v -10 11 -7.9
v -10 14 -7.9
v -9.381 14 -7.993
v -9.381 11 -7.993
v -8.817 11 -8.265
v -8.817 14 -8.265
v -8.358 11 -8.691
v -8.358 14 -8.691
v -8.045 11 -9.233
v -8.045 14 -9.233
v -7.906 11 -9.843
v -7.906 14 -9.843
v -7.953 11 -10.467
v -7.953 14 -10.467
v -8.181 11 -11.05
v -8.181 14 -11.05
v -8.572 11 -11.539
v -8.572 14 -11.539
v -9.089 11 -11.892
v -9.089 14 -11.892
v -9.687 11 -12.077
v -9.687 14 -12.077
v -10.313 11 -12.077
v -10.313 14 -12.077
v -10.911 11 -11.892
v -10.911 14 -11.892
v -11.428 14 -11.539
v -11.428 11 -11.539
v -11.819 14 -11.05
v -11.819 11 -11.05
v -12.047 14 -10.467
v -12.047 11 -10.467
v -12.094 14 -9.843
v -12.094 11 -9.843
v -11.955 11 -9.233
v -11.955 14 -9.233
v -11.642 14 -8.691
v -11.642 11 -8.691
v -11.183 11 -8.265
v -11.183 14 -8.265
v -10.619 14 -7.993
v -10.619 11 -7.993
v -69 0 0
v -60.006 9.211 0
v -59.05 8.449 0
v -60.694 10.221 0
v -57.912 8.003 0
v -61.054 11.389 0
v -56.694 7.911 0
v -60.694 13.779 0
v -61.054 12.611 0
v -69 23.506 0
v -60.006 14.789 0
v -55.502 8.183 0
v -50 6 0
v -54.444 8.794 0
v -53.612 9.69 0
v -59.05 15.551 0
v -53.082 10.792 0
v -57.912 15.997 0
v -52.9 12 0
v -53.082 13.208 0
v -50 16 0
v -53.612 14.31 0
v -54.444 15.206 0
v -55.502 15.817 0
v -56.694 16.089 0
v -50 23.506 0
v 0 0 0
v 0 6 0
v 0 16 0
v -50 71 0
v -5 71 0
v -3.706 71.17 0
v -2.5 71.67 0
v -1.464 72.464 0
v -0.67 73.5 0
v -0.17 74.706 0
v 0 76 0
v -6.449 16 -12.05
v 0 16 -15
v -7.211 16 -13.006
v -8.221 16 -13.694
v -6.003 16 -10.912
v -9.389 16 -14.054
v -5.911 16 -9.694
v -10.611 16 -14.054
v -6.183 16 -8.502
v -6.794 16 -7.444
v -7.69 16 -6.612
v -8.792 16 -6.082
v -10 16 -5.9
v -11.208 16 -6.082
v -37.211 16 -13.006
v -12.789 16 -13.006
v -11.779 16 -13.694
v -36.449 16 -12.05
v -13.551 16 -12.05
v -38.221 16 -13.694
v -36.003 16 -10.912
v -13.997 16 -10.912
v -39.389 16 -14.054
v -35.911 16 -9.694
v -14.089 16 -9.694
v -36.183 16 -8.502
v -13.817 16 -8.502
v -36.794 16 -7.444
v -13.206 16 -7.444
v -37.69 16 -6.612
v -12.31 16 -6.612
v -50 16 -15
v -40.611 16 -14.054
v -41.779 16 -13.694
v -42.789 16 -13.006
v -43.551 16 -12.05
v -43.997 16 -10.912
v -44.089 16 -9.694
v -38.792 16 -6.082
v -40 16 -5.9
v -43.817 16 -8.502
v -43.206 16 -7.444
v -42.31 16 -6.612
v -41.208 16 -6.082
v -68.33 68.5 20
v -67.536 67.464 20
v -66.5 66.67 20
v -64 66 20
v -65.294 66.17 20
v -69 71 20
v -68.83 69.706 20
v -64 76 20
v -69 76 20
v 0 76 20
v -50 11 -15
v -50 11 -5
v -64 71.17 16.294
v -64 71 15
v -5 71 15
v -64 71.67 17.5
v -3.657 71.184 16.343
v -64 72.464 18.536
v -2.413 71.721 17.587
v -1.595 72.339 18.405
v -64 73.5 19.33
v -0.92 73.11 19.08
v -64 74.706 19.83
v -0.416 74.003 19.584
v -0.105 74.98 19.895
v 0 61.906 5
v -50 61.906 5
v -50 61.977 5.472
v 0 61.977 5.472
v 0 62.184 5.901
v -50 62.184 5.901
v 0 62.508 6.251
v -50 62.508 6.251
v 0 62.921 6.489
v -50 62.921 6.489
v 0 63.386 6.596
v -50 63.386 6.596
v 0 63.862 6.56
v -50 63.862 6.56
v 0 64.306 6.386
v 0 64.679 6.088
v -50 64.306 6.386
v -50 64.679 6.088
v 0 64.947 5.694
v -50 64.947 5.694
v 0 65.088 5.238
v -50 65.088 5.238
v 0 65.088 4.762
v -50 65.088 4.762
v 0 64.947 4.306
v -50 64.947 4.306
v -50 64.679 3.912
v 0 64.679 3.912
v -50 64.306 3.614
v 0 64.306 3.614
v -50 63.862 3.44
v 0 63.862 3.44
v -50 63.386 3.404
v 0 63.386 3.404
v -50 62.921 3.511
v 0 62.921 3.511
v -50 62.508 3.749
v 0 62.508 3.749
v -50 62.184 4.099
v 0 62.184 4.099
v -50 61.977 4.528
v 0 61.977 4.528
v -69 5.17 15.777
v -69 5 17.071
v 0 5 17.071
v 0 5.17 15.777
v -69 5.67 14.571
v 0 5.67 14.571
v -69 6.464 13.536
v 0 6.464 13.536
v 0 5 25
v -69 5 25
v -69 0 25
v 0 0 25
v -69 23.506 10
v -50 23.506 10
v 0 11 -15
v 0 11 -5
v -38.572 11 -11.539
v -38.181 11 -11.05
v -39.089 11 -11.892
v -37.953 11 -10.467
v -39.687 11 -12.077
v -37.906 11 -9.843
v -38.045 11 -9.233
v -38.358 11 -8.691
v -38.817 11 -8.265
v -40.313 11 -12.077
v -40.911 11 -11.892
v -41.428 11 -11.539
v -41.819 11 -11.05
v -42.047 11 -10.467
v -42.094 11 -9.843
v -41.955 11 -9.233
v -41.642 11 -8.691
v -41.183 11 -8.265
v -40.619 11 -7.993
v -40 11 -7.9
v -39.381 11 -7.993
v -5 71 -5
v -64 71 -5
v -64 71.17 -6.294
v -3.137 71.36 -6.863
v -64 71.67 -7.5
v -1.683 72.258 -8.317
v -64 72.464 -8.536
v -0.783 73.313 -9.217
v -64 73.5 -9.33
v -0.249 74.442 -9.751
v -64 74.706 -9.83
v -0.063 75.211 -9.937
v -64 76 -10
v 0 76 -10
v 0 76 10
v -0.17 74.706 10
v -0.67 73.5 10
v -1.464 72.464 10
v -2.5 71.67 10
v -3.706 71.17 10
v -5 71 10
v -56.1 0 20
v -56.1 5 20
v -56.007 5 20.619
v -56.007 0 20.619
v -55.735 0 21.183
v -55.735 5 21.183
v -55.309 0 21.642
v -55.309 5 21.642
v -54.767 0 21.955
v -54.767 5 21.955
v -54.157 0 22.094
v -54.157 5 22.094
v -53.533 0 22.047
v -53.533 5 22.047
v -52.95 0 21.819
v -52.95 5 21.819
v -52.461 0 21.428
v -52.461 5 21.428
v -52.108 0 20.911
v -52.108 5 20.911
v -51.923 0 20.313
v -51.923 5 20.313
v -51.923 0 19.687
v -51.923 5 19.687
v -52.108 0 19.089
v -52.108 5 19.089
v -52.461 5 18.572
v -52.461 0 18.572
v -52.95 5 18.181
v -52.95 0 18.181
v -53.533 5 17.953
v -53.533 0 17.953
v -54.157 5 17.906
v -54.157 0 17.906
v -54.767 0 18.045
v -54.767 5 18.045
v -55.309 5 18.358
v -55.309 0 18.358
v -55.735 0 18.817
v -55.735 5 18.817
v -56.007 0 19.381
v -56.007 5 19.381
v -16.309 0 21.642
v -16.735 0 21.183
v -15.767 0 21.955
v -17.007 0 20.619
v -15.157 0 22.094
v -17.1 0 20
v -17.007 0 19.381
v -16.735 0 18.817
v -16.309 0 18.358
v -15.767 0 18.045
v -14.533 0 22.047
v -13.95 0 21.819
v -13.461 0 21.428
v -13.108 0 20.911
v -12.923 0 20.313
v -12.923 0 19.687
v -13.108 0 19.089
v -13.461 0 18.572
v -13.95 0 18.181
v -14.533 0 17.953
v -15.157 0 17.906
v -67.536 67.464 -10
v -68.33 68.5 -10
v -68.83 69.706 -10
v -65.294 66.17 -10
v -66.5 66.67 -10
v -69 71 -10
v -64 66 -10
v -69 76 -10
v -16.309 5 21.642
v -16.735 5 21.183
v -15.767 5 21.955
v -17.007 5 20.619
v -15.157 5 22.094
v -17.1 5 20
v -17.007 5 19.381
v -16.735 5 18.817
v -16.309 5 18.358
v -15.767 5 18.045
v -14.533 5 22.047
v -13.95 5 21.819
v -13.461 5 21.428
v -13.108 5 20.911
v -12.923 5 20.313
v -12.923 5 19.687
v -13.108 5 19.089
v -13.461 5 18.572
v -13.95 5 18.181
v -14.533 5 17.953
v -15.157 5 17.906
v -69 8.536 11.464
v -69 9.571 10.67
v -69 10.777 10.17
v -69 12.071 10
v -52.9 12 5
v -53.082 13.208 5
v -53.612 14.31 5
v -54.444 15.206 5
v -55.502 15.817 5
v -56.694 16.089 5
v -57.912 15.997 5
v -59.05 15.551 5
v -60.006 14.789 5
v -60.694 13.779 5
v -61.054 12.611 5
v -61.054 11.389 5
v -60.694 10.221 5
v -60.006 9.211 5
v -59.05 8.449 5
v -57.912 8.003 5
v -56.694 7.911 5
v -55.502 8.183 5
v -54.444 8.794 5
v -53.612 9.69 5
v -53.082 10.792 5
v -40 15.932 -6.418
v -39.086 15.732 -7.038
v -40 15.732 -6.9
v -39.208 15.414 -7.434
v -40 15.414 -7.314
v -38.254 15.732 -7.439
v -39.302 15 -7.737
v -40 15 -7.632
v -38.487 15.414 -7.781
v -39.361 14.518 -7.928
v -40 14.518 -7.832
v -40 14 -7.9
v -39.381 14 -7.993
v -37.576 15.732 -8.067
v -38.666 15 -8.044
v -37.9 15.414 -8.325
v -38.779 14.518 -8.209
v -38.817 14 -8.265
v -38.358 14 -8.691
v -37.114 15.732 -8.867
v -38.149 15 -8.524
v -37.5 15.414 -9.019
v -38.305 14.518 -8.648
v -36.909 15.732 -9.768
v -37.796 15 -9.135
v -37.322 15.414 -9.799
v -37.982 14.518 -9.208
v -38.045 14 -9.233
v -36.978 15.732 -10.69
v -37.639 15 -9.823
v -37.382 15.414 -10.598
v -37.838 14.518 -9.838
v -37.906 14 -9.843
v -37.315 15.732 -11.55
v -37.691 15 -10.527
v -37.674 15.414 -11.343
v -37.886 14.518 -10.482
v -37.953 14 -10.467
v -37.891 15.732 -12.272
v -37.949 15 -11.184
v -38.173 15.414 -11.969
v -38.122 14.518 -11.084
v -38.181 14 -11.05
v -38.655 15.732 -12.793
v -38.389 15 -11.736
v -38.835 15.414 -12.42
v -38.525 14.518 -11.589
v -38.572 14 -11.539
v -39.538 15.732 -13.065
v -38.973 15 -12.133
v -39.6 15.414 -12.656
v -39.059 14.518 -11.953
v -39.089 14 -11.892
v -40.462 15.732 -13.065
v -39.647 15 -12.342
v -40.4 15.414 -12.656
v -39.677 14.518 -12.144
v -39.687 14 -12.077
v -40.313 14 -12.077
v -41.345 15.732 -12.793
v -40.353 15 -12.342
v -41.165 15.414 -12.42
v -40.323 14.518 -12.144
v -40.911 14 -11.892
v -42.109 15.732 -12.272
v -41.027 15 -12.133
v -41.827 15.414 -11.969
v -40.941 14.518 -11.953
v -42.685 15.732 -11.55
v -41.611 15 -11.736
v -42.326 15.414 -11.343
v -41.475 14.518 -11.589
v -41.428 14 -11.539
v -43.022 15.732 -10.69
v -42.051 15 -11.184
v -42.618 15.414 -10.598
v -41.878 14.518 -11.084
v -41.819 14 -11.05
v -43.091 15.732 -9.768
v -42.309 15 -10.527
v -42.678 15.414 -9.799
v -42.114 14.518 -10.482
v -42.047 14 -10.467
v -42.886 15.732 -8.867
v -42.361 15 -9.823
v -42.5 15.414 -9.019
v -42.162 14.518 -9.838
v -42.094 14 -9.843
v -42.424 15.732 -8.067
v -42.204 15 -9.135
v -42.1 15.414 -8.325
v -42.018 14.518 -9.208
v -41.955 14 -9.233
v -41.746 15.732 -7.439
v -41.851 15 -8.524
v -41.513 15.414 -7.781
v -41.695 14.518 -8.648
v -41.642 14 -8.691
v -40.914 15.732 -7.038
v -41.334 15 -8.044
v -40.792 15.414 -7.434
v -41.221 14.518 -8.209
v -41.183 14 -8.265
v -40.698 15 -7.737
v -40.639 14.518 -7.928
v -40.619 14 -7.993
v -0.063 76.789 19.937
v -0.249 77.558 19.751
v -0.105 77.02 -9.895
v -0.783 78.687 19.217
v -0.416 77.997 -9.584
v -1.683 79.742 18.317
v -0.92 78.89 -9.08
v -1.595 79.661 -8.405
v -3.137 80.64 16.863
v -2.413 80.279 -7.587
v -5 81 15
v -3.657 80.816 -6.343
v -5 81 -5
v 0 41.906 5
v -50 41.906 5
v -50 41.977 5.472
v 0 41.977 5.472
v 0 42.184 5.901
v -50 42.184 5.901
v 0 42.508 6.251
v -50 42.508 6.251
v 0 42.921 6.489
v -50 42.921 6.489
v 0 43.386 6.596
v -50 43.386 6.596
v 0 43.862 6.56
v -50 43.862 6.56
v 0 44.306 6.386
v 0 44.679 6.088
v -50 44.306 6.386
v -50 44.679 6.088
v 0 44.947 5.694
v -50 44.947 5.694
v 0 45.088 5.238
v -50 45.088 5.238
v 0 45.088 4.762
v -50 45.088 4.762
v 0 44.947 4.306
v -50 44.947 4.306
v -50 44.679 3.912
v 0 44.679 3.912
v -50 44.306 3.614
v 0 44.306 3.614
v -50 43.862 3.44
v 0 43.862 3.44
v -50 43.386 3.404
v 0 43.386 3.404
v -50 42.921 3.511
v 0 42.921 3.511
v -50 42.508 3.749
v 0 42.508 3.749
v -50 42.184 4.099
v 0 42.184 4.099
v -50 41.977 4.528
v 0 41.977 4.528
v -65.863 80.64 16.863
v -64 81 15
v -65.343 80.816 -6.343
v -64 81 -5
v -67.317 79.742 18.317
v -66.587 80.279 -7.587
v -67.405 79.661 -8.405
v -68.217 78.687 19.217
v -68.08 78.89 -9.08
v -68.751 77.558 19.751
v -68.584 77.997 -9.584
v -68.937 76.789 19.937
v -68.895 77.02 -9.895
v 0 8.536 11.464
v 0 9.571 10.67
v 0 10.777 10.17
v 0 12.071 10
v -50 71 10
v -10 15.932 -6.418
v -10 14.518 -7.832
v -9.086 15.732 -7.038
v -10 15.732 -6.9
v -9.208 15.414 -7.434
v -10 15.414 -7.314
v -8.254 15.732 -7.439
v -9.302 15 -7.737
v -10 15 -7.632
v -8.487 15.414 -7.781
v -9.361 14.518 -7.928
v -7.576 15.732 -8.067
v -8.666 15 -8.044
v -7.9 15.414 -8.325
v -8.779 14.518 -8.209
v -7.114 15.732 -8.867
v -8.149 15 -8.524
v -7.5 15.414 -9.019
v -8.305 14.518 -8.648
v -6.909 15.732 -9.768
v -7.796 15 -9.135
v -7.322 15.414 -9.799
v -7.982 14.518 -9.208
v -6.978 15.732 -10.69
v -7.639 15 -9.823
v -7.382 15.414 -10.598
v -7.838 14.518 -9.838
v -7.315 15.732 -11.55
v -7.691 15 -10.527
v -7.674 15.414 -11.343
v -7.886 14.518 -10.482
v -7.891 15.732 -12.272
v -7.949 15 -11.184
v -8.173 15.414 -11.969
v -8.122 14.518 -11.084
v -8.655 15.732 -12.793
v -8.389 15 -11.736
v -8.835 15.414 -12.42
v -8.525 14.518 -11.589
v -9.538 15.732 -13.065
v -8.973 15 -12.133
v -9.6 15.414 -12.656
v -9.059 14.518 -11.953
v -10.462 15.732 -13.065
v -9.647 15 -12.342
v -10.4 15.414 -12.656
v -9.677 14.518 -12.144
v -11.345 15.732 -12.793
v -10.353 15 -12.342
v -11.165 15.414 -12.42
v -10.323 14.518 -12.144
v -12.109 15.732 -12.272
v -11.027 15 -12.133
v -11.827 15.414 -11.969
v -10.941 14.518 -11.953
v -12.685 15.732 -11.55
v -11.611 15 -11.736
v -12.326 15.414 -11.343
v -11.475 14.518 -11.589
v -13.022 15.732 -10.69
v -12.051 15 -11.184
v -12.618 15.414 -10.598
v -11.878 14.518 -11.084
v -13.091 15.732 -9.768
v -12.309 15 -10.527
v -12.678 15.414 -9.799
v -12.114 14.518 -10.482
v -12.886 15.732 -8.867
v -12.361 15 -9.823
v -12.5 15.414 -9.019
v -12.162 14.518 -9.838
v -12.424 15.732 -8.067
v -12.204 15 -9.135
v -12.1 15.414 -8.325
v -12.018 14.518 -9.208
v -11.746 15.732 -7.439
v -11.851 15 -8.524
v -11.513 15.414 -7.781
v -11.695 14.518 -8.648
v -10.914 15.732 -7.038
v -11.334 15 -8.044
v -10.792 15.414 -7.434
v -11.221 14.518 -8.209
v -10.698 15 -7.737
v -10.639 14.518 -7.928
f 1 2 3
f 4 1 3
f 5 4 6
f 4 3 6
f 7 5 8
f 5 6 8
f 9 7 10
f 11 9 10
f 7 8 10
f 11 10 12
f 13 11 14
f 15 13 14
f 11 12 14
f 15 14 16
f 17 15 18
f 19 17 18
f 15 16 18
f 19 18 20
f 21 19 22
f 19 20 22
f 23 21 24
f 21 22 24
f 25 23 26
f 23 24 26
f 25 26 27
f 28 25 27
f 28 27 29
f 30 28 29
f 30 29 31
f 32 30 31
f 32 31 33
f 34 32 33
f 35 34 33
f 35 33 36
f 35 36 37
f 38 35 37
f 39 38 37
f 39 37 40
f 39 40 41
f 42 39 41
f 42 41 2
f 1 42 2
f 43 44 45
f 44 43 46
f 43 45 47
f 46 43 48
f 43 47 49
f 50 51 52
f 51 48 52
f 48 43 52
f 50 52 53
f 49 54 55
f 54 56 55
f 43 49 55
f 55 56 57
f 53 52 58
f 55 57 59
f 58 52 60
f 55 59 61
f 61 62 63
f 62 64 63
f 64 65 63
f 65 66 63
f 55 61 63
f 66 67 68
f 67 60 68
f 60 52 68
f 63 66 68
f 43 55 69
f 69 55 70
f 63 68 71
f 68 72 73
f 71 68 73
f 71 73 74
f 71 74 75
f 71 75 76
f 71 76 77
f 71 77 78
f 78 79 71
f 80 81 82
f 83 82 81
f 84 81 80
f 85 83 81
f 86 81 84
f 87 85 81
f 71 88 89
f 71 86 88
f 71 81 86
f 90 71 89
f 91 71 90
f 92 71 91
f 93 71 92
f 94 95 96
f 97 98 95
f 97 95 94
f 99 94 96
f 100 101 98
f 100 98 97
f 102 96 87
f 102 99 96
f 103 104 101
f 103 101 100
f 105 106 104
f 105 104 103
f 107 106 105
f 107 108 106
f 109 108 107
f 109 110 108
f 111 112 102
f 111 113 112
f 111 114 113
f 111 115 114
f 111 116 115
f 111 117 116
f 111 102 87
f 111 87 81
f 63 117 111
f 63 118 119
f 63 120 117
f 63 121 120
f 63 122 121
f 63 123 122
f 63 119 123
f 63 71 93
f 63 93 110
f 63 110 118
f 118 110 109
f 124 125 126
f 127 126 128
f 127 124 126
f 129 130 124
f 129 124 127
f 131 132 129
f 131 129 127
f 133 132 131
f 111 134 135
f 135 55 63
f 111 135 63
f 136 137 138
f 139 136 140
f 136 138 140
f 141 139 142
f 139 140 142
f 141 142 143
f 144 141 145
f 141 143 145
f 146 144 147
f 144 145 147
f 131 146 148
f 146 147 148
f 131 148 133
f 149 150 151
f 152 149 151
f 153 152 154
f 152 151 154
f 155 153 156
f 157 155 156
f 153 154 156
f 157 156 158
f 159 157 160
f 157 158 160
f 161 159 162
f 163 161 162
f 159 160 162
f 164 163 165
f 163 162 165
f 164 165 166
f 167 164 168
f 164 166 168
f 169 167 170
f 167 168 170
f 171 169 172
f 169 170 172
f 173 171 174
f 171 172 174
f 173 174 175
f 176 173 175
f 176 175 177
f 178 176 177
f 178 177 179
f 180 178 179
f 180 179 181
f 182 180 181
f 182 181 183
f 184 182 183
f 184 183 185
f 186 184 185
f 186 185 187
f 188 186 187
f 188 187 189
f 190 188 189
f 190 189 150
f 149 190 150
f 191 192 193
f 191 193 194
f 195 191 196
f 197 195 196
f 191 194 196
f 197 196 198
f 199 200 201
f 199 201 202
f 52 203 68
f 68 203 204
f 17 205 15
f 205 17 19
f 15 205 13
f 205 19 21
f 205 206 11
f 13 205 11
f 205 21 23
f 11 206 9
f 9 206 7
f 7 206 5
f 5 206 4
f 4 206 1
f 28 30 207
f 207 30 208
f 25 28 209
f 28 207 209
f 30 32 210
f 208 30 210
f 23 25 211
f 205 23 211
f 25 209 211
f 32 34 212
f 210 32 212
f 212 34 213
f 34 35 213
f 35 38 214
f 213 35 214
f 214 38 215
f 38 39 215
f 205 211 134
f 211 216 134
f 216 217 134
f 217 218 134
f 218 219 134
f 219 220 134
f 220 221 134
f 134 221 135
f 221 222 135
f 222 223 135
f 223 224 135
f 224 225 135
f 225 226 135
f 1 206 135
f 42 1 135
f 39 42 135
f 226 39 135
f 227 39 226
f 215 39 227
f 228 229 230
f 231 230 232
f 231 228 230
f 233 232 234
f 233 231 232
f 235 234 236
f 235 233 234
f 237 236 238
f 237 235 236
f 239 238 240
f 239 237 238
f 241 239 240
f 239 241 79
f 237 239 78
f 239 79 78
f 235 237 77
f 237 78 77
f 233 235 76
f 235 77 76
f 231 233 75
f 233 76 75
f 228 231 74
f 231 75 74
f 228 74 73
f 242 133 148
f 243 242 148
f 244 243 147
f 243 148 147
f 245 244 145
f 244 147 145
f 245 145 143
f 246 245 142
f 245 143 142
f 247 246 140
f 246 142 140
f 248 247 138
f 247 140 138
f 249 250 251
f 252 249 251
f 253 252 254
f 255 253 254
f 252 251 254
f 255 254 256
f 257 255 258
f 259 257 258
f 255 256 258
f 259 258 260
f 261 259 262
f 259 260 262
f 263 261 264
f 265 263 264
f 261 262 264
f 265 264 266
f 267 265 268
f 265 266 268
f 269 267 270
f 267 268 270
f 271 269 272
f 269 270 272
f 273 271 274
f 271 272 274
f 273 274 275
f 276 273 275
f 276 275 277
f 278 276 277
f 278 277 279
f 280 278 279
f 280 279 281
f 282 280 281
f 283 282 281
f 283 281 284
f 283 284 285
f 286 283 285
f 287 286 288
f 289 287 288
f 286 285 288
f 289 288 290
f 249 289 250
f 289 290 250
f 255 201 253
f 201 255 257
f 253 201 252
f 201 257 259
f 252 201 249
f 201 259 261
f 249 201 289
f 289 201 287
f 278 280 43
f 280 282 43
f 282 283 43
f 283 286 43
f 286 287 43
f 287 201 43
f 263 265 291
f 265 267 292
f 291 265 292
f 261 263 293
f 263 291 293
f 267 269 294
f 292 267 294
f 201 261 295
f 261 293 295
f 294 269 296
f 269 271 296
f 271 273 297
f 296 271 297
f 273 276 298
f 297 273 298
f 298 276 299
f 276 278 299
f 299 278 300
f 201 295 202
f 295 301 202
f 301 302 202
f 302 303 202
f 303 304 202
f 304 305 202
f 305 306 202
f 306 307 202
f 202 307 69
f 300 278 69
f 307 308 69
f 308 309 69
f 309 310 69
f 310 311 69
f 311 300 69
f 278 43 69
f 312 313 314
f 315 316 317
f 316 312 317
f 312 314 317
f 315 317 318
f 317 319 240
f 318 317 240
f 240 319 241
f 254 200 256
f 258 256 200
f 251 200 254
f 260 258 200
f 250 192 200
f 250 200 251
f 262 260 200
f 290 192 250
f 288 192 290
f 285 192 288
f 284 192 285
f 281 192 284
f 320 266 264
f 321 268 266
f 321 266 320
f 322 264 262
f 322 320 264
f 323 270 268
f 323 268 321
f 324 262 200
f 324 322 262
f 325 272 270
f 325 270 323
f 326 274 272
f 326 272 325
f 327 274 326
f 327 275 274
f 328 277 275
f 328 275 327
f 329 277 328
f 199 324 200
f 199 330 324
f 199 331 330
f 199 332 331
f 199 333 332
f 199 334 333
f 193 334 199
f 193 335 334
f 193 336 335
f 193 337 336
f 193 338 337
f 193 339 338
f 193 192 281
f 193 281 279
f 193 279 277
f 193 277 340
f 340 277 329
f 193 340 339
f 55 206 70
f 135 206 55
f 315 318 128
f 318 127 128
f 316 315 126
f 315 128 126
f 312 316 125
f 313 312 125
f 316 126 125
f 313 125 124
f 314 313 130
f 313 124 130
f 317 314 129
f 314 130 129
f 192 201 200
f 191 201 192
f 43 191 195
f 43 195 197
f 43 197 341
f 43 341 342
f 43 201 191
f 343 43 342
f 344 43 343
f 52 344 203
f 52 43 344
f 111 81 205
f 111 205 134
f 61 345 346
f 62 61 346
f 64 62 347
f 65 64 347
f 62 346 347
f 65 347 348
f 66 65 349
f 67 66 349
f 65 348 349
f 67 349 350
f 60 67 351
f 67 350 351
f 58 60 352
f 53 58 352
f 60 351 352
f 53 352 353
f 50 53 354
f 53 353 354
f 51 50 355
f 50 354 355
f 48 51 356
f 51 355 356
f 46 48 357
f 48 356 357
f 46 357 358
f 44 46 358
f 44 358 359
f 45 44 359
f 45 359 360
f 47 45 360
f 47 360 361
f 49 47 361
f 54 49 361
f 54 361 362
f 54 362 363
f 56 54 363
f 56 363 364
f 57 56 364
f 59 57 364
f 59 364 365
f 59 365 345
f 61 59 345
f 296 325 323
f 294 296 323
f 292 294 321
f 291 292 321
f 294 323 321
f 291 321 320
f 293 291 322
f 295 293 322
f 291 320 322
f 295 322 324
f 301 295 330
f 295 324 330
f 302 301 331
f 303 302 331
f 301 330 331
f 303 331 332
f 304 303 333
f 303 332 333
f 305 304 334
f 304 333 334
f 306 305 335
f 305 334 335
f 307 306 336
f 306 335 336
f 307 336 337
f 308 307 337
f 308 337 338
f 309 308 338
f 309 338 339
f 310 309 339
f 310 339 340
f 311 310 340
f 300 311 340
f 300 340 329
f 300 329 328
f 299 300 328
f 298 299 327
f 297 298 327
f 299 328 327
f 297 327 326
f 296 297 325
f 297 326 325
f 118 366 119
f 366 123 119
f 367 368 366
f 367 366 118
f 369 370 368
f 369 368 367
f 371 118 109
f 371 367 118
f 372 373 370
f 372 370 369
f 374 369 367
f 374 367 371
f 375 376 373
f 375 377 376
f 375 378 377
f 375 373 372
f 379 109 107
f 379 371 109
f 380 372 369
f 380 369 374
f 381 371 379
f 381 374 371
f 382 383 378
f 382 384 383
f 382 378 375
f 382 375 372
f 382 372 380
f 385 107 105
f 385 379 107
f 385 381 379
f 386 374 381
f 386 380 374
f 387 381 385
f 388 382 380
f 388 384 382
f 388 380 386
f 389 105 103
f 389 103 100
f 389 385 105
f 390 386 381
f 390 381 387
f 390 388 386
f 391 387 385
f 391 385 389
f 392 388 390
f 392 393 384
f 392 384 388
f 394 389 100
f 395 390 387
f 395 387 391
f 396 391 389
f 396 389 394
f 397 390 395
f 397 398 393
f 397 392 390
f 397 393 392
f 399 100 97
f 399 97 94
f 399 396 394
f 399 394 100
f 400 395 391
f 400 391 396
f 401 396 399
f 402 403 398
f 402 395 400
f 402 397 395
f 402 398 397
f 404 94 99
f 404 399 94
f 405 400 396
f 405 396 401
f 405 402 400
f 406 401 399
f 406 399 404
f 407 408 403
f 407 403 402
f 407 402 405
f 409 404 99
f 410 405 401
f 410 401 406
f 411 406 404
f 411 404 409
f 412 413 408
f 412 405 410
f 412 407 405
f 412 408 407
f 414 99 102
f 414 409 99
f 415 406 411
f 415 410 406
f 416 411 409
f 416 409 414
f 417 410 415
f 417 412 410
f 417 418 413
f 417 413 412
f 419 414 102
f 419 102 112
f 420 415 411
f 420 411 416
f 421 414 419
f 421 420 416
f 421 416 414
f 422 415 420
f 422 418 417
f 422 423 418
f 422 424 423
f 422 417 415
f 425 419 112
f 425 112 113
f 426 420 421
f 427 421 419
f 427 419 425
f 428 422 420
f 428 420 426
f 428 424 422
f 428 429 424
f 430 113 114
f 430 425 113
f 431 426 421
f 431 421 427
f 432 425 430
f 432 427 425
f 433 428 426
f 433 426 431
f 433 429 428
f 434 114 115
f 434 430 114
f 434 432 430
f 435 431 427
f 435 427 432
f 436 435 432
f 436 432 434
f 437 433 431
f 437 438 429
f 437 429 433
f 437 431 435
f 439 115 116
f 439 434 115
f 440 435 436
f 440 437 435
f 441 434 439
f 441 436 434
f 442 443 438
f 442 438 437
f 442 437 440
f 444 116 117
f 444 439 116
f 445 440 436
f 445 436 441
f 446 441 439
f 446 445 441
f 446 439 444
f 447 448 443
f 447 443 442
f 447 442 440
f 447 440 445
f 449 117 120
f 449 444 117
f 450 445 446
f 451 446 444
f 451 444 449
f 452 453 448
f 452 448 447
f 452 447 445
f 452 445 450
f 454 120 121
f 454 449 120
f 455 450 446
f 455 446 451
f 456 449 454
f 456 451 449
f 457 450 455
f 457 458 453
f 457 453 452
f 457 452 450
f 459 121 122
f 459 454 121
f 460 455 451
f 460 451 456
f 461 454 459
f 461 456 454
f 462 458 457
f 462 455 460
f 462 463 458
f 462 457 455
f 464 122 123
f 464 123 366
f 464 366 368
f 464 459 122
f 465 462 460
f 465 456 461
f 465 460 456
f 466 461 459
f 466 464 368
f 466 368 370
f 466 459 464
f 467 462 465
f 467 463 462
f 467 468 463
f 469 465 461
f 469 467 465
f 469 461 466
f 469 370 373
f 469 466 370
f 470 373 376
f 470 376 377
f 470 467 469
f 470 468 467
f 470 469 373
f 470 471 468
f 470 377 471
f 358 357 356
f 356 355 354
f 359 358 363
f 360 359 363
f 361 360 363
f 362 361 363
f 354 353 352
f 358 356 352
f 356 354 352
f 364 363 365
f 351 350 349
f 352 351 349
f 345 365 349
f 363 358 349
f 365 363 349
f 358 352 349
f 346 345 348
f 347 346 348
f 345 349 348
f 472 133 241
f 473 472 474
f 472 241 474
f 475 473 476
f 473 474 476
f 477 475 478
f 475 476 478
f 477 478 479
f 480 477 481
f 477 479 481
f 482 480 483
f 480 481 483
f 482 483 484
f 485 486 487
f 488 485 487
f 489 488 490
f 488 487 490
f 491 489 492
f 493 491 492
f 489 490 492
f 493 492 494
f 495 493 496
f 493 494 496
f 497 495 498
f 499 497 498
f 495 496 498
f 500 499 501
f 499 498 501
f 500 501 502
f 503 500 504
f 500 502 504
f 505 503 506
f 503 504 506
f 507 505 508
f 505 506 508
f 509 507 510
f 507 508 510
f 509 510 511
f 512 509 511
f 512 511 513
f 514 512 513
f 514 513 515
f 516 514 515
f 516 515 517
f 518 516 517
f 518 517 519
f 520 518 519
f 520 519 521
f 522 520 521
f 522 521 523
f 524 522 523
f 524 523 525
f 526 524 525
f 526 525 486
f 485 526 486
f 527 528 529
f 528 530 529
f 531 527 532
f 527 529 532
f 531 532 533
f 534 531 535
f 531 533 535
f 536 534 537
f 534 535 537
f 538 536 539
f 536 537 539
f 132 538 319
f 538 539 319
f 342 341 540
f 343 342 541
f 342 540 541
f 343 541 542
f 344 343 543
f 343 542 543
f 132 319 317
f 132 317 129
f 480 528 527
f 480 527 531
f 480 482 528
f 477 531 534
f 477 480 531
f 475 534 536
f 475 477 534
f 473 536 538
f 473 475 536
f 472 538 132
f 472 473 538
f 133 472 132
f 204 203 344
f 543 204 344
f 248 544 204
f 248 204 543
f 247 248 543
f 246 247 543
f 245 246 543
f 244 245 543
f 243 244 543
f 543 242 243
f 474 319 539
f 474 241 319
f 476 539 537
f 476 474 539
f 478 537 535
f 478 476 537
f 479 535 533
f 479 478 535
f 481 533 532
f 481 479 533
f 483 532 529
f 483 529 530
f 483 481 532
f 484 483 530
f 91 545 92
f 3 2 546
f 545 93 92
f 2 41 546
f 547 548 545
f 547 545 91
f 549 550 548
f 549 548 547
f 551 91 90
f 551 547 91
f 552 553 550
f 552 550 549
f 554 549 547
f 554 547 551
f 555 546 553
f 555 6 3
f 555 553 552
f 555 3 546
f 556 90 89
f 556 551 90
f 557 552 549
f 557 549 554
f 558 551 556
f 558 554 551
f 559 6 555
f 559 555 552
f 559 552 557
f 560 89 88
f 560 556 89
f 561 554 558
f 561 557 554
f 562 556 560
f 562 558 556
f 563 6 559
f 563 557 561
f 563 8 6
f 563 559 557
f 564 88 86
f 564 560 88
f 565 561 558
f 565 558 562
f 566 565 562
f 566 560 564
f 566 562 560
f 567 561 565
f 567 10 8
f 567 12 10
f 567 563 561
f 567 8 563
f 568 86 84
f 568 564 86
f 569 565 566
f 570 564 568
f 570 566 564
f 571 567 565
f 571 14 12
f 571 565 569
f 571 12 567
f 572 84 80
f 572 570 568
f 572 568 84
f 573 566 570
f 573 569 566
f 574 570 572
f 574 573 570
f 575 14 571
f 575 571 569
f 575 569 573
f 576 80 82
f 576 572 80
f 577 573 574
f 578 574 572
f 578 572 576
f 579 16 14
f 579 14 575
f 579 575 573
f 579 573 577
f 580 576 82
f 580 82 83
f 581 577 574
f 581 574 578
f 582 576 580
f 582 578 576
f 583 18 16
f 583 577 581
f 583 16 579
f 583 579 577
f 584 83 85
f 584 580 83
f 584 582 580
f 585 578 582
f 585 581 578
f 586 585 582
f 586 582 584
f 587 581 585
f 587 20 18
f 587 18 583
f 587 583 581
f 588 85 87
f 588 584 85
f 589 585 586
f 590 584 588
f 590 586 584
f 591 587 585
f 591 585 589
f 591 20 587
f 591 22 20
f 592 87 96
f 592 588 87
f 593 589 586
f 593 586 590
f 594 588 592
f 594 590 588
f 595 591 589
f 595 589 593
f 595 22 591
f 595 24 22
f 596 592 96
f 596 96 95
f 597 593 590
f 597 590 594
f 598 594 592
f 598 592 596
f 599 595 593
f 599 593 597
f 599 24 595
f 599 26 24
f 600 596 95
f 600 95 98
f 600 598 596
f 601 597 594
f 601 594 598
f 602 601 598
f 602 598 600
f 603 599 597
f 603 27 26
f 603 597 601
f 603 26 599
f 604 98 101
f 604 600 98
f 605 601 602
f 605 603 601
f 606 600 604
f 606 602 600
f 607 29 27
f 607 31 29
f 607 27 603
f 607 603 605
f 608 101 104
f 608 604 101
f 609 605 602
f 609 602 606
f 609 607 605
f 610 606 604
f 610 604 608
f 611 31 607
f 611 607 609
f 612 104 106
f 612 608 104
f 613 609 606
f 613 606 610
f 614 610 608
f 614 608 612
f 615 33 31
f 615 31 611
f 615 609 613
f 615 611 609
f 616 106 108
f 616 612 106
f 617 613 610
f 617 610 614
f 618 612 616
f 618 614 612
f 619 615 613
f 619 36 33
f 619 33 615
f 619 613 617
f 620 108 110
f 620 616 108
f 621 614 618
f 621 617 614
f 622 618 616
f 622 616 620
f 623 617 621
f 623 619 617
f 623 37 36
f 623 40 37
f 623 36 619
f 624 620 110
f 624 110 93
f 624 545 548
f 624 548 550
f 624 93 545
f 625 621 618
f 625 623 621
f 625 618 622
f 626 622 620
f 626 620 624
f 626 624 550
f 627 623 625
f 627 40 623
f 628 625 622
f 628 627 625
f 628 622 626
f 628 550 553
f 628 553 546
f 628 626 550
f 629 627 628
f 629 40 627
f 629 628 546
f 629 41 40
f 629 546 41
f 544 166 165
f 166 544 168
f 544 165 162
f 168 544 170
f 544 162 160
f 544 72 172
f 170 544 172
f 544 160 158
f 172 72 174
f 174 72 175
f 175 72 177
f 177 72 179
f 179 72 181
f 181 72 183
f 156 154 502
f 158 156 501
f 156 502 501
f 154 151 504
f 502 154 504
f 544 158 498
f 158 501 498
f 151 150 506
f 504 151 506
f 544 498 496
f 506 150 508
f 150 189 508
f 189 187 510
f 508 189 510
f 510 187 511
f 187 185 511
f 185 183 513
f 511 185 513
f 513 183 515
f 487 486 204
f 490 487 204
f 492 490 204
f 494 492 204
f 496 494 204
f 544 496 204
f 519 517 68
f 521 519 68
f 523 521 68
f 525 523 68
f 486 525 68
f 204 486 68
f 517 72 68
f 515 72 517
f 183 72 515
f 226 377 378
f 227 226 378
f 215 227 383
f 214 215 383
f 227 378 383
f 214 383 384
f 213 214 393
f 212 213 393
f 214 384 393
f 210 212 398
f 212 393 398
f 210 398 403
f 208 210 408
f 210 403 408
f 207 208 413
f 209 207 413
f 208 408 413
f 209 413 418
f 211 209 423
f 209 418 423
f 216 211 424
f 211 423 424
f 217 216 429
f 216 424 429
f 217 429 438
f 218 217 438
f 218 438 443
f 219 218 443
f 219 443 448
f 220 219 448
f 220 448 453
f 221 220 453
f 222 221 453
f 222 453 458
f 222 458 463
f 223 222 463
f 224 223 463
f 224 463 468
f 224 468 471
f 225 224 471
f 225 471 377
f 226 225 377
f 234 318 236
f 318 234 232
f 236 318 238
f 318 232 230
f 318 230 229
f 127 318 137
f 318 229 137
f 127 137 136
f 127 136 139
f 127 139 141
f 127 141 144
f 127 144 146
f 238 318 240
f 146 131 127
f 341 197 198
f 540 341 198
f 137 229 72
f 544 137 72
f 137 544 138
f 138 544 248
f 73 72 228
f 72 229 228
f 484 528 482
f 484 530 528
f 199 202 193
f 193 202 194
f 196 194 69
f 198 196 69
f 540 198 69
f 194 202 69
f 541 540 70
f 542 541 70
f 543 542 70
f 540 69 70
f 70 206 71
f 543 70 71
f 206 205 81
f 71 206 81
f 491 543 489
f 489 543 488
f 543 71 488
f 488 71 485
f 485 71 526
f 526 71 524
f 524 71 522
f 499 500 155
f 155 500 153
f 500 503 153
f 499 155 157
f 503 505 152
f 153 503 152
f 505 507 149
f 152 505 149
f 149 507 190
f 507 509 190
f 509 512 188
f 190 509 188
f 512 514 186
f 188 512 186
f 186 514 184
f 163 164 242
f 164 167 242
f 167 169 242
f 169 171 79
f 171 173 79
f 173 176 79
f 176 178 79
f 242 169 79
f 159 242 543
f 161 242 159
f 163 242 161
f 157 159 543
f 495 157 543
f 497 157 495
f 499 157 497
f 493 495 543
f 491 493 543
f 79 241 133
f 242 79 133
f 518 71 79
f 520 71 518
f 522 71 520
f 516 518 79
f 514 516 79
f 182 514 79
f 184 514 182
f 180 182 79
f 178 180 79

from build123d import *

# Parameters (mm, degrees)
BOSS_EXTRU_1_DEPTH      = 10
BOSS_EXTRU_2_DEPTH      = 10
BOSS_EXTRU_2_DEPTH_BACK = 20
ESQUISSE2_W             = 69
ESQUISSE2_H             = 10
ESQUISSE4_W             = 19
ESQUISSE4_H             = 23.50582434
ESQUISSE4_R             = 4.1
BOSS_EXTRU_3_DEPTH      = 10
ESQUISSE5_W             = 5
ESQUISSE5_H             = 30
BOSS_EXTRU_4_DEPTH      = 5
ESQUISSE6_W             = 69
ESQUISSE6_H             = 5
BOSS_EXTRU_5_DEPTH      = 15
ESQUISSE7_R             = 5.448918283
BOSS_EXTRU_6_DEPTH      = 5
CHANFREIN2_SIZE         = 5
ESQUISSE8_R             = 2.1
ENL_V_MAT_EXTRU_1_DEPTH = 5
ESQUISSE9_R             = 1.6
ENL_V_MAT_EXTRU_2_DEPTH = 68
ESQUISSE10_W            = 50
ESQUISSE10_H            = 5
BOSS_EXTRU_7_DEPTH      = 15
CHANFREIN3_SIZE         = 5
ESQUISSE11_R            = 2.1
ENL_V_MAT_EXTRU_3_DEPTH = 10
CONG_1_R                = 2
CONG_2_R                = 5


with BuildPart() as part:
    # Esquisse1 → Boss.-Extru.1 (new body)
    with BuildSketch(Plane.XY):
        Polygon((0, 0), (0, 81), (-69, 81), (-69, 66), (-64, 66), (-64, 71), (-50, 71), (-50, 0), align=None)
    extrude(amount=BOSS_EXTRU_1_DEPTH)

    # Esquisse2 → Boss.-Extru.2 (add, two sides: drawn at the far end of the back side and taken through both)
    with BuildSketch(Plane.XY.offset(10).offset(-BOSS_EXTRU_2_DEPTH_BACK)):
        with Locations((-34.5, 76)):
            Rectangle(ESQUISSE2_W, ESQUISSE2_H)
    extrude(amount=BOSS_EXTRU_2_DEPTH + BOSS_EXTRU_2_DEPTH_BACK)

    # Esquisse4 → Boss.-Extru.3 (add)
    with BuildSketch(Plane.XY.offset(10)):
        with Locations((-59.5, 11.75291217)):
            Rectangle(ESQUISSE4_W, ESQUISSE4_H)
        with Locations((-57, 12)):
            Circle(ESQUISSE4_R, mode=Mode.SUBTRACT)
    extrude(amount=-BOSS_EXTRU_3_DEPTH)

    # Esquisse5 → Boss.-Extru.4 (add)
    with BuildSketch(Plane.XZ.offset(-71)):
        with Locations((-66.5, 5)):
            Rectangle(ESQUISSE5_W, ESQUISSE5_H)
    extrude(amount=BOSS_EXTRU_4_DEPTH)

    # Esquisse6 → Boss.-Extru.5 (add)
    with BuildSketch(Plane.XY.offset(10)):
        with Locations((-34.5, 2.5)):
            Rectangle(ESQUISSE6_W, ESQUISSE6_H)
    extrude(amount=BOSS_EXTRU_5_DEPTH)

    # Esquisse7 → Boss.-Extru.6 (add)
    with BuildSketch(Plane.XY.offset(10)):
        with Locations((-57, 12)):
            Circle(ESQUISSE7_R)
    extrude(amount=-BOSS_EXTRU_6_DEPTH)

    # Chanfrein2
    chanfrein2_edges = [part.edges().sort_by_distance(p)[0] for p in [
        (-34.5, 5, 10),
    ]]
    chamfer(chanfrein2_edges, length=CHANFREIN2_SIZE)

    # Esquisse8 → Enlèv. mat.-Extru.1 (cut)
    with BuildSketch(Plane(origin=(0, 5, 0), x_dir=(1, 0, 0), z_dir=(0, 1, 0))):
        with Locations(Location((-15, -20, 0), (0, 0, 180))):
            Circle(ESQUISSE8_R)
        with Locations(Location((-54, -20, 0), (0, 0, 180))):
            Circle(ESQUISSE8_R)
    extrude(amount=-ENL_V_MAT_EXTRU_1_DEPTH, mode=Mode.SUBTRACT)

    # Esquisse9 → Enlèv. mat.-Extru.2 (cut)
    with BuildSketch(Plane.ZY.offset(50)):
        with Locations(Location((5, 63.50582434, 0), (0, 0, 270))):
            Circle(ESQUISSE9_R)
        with Locations(Location((5, 43.50582434, 0), (0, 0, 270))):
            Circle(ESQUISSE9_R)
    extrude(amount=-ENL_V_MAT_EXTRU_2_DEPTH, mode=Mode.SUBTRACT)

    # Esquisse10 → Boss.-Extru.7 (add)
    with BuildSketch(Plane(origin=(0, 0, 0), x_dir=(-1, 0, 0), z_dir=(0, 0, -1))):
        with Locations((25, 13.5)):
            Rectangle(ESQUISSE10_W, ESQUISSE10_H)
    extrude(amount=BOSS_EXTRU_7_DEPTH)

    # Chanfrein3
    chanfrein3_edges = [part.edges().sort_by_distance(p)[0] for p in [
        (-25, 11, 0),
    ]]
    chamfer(chanfrein3_edges, length=CHANFREIN3_SIZE)

    # Esquisse11 → Enlèv. mat.-Extru.3 (cut)
    with BuildSketch(Plane(origin=(0, 16, 0), x_dir=(1, 0, 0), z_dir=(0, 1, 0))):
        with Locations(Location((-10, 10, 0), (0, 0, 270))):
            Circle(ESQUISSE11_R)
        with Locations(Location((-40, 10, 0), (0, 0, 270))):
            Circle(ESQUISSE11_R)
    extrude(amount=-ENL_V_MAT_EXTRU_3_DEPTH, mode=Mode.SUBTRACT)

    # Congé1
    cong_1_edges = [part.edges().sort_by_distance(p)[0] for p in [
        (-10, 16, -12.1),
        (-40, 16, -12.1),
    ]]
    fillet(cong_1_edges, radius=CONG_1_R)

    # Congé2
    cong_2_edges = [part.edges().sort_by_distance(p)[0] for p in [
        (-34.5, 10, 10),
        (-34.5, 5, 15),
        (-32, 71, -10),
        (0, 71, -5),
        (0, 71, 15),
        (-32, 71, 20),
        (-34.5, 81, 20),
        (-34.5, 81, -10),
        (0, 81, 5),
        (-69, 81, 5),
        (-69, 66, 5),
    ]]
    fillet(cong_2_edges, radius=CONG_2_R - 0.0001)  # a hair under: the kernel refuses the full size


solid = part.part
